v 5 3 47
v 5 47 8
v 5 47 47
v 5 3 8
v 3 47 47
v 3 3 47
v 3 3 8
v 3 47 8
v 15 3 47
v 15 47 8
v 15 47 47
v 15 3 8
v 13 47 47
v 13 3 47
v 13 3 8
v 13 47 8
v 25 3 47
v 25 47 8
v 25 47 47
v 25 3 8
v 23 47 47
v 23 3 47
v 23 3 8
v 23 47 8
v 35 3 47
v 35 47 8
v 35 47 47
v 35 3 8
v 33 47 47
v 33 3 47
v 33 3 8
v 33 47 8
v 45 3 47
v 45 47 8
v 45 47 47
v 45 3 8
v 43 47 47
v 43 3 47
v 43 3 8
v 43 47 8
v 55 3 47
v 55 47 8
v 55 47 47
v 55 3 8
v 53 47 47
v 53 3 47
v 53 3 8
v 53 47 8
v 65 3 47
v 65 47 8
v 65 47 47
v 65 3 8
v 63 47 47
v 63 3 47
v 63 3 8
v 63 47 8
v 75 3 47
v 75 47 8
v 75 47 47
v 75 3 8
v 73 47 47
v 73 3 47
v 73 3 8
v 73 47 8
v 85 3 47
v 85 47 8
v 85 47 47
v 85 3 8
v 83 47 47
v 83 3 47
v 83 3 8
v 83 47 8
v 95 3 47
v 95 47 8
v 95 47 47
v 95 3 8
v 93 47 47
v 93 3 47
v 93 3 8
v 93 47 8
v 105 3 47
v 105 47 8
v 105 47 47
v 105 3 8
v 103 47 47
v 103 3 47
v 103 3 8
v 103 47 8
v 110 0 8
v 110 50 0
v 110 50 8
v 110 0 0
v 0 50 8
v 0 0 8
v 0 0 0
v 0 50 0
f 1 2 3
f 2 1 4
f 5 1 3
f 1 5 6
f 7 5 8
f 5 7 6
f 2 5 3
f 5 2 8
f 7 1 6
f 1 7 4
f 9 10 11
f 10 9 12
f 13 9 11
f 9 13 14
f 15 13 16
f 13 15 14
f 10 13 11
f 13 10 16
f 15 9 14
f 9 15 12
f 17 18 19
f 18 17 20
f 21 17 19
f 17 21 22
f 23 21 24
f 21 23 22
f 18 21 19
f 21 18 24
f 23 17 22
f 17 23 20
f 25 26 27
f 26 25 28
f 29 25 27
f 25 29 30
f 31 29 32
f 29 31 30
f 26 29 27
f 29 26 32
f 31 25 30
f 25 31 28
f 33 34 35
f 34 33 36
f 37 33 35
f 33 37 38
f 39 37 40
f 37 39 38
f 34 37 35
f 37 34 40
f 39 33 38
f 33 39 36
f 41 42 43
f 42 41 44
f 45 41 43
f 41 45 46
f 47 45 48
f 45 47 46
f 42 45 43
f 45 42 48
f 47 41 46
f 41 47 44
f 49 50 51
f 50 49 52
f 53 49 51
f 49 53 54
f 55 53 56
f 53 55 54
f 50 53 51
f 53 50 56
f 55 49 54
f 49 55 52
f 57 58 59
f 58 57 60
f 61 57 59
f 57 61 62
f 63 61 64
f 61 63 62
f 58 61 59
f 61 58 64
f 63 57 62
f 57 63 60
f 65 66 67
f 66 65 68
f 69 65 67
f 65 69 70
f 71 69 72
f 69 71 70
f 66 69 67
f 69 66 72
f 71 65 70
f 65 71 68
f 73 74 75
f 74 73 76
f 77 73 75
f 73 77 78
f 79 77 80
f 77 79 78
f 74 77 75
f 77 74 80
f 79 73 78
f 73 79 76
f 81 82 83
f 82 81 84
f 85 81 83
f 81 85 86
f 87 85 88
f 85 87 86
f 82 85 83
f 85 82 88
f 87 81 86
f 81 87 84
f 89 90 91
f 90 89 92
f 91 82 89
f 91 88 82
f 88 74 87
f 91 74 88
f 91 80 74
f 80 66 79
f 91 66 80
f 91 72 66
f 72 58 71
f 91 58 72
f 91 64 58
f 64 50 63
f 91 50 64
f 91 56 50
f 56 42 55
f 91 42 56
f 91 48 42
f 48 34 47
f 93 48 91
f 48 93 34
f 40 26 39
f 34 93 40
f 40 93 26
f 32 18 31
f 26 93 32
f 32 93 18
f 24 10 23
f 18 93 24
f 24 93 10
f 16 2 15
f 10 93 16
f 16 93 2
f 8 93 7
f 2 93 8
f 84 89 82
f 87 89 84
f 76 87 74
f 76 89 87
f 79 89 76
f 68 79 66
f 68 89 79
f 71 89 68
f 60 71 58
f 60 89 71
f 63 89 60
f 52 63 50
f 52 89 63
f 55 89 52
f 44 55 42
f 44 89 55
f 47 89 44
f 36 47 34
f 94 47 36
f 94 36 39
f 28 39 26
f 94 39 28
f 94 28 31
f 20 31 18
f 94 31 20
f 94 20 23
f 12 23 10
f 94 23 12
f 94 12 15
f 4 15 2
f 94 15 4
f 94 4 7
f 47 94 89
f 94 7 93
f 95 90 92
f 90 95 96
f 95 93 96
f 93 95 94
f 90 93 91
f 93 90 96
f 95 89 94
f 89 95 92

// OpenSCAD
$fn = 32;

// ----------------------------------------------------------------------
// Heatsink: uniform fin block
// ----------------------------------------------------------------------

// --- parameters (mm) ---
base_l = 110;             // base length, X
base_w = 50;              // base width, Y
base_t = 8;               // base plate thickness
fin_h = 40;               // fin height above the base
fin_t = 2;                // fin thickness
edge = 3;                 // margin from the base ends
pitch = 10;               // fin pitch
fit_tol = 0.02;           // tolerance for press fits, mm
free_tol = 0.2;           // tolerance for clearance fits, mm

n_fins = floor((base_l - 2 * edge - fin_t) / pitch) + 1;  // fin count
total_h = base_t + fin_h - 1;  // overall height

union() {
  cube([base_l, base_w, base_t]);
  for (i = [0 : n_fins - 1])
    translate([edge + i * pitch, edge, base_t - 1])
      cube([fin_t, base_w - 2 * edge, fin_h]);
}
